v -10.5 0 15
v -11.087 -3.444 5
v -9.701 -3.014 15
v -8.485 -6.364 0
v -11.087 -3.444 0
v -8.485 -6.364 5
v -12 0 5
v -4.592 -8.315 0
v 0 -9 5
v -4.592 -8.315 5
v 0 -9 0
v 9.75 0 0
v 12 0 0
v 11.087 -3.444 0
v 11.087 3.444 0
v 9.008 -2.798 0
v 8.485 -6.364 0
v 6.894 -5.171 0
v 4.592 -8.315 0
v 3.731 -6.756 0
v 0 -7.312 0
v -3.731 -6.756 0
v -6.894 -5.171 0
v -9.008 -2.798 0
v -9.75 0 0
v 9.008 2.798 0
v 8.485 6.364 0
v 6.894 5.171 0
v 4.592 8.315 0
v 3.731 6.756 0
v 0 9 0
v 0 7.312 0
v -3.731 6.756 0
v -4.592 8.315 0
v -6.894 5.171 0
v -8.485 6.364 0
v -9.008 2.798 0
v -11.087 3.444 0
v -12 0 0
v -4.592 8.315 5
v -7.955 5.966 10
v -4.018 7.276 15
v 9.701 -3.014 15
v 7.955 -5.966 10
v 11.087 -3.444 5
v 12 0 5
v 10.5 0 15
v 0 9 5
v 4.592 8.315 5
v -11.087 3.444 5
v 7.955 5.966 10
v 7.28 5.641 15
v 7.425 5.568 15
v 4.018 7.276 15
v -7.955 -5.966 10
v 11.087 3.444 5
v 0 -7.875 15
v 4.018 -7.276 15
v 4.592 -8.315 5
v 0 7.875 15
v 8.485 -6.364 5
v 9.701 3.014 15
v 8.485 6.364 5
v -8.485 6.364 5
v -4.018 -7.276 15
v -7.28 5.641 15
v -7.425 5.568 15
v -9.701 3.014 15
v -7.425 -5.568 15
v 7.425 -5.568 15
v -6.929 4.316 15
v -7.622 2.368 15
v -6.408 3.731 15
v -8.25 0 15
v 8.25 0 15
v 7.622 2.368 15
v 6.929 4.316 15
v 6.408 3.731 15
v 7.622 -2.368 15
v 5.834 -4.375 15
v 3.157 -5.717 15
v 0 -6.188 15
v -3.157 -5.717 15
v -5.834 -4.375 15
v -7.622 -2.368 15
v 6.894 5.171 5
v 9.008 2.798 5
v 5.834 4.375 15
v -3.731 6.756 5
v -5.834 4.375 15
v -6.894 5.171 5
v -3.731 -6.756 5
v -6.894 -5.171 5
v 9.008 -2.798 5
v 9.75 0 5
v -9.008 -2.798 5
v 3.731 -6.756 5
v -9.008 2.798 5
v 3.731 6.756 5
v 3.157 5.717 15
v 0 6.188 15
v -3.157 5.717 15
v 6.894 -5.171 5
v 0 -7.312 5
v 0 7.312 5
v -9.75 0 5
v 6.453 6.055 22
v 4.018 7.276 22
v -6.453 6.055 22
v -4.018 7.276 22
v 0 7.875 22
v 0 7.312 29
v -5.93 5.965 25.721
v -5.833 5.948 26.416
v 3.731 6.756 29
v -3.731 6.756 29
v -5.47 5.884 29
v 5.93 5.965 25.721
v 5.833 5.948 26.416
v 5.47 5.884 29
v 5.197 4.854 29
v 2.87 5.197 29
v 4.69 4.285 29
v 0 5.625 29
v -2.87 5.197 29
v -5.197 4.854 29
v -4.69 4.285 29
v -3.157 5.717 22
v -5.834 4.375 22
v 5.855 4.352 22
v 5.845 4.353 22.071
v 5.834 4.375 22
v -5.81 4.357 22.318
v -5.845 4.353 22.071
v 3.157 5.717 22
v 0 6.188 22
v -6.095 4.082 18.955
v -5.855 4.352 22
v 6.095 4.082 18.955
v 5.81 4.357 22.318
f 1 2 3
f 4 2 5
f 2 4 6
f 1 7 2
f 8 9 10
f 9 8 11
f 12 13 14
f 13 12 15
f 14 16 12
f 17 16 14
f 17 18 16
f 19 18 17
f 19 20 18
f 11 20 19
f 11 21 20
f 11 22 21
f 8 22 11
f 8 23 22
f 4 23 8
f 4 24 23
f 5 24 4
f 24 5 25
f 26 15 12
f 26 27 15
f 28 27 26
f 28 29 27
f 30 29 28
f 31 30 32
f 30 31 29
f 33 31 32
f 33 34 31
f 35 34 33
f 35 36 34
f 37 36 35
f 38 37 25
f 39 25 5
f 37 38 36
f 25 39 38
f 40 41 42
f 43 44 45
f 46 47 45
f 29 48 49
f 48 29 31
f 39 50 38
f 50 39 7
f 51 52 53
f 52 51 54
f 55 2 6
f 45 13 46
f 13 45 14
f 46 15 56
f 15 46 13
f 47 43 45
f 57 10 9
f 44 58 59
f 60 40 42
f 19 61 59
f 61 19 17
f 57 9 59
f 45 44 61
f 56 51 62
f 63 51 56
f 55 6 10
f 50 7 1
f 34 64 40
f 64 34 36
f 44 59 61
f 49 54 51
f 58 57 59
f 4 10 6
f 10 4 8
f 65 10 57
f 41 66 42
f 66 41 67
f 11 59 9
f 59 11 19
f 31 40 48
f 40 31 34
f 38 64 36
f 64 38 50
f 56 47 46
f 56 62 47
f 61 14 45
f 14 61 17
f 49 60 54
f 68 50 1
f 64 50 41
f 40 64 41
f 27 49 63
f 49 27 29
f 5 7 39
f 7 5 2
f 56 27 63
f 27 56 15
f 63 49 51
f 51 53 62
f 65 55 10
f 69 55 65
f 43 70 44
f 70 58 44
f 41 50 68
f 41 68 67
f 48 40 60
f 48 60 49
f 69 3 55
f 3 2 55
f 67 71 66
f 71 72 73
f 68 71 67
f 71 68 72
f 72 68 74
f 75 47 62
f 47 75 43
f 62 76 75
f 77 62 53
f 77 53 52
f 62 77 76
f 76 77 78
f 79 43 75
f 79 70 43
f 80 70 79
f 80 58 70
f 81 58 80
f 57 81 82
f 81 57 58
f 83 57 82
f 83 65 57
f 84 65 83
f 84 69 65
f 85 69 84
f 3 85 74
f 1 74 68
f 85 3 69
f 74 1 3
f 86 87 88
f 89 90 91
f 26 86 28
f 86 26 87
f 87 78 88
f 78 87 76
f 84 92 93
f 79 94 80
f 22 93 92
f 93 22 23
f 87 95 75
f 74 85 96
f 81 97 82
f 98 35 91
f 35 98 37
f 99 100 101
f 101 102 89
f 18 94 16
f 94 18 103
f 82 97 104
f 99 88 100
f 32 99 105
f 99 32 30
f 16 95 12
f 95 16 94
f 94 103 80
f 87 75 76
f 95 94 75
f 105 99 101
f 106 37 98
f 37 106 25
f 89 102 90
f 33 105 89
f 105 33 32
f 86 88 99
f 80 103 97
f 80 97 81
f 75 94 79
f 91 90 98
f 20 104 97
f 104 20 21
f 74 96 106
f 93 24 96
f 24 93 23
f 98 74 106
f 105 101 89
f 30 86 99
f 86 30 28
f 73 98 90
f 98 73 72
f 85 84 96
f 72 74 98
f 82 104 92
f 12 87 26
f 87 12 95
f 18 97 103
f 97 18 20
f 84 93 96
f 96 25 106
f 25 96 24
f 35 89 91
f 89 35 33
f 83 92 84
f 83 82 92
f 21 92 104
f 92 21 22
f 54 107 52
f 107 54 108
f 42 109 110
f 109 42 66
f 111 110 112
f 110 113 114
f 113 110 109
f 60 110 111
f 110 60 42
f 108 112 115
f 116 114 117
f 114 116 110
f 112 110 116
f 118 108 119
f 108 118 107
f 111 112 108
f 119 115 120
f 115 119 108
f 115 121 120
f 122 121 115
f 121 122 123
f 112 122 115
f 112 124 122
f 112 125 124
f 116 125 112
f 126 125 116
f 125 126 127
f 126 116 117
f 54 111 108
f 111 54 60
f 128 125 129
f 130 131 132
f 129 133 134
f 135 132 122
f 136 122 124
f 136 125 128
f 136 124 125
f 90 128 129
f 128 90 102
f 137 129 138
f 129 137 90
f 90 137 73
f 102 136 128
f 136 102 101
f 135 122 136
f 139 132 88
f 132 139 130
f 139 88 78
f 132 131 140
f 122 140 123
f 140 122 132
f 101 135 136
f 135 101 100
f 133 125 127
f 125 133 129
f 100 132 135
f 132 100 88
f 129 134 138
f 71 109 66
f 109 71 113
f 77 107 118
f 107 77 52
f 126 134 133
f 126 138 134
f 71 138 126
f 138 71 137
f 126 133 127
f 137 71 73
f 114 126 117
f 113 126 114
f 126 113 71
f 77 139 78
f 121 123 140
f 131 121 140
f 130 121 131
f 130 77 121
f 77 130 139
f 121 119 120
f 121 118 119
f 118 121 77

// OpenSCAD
$fn=16;
finger_rings = [  // Finger = the bottom half of the pick
    [13, 5],  // [radius, height]. For radius, use the widest part of your finger.
    [12, 5],
    [11, 5],
];
thickness = 3;
aspect_ratio = 0.75;  // 
nail_rings = [  // Nail = the top part of the pick
    [11, 7],
    [10, 7],
];
nail_width_bottom = 20;
nail_width_top = 15;  // Do not go below thickness/2 for best result

// Determine dependent dimensions of model
nail_height = calculate_rings_height(nail_rings, len(nail_rings)-1);
total_height = calculate_rings_height(finger_rings, len(finger_rings)-1) + nail_height;
max_radius = calculate_rings_max_radius(finger_rings, len(finger_rings)-1);

// Warn if user stuffed up dimensions
if (finger_rings[len(finger_rings)-1][0] != nail_rings[0][0])
    echo("WARNING: finger and nail are not aligned, model will be broken");

function calculate_ring_z(finger_rings, i1) =  //  Use recursive functions because OpenSCAD calculates variables at runtime
    (i1 == 0 ? 0 : finger_rings[i1-1][1] + calculate_ring_z(finger_rings, i1-1));

function calculate_rings_height(finger_rings, i1) =
    (i1 == 0 ? finger_rings[0][1] : finger_rings[i1][1] + calculate_rings_height(finger_rings, i1-1));

function calculate_rings_max_radius(finger_rings, i1) = 
    (i1 == 0 ? finger_rings[0][0] : max(finger_rings[i1][0], finger_rings[i1-1][0]));

module create_hull(finger_rings) {
    hull() {
        for(i = [0 : len(finger_rings)-1]) {
            ring = finger_rings[i];
            r = ring[0];
            h = ring[1];
            z = calculate_ring_z(finger_rings, i);
            translate([0, 0, z])
                cylinder(r=r, h=h);
        }
    }
}

module create_rings(rings, thickness) {
    outer_rings = [for (i = [0:len(rings)-1]) [rings[i][0]+thickness, rings[i][1]]];
    difference() {
        create_hull(outer_rings);
        create_hull(rings);
    }
}

module create_nail(z, r) {
    nail_height = calculate_rings_height(nail_rings, len(nail_rings)-1);
    nail_y_offset = nail_rings[len(nail_rings)-1][0] + thickness/2;
    translate([0, 0, z]) {
        intersection() {
            create_rings(nail_rings, thickness=thickness);
            translate([0, nail_y_offset, 0])
                cylinder(h=nail_height, r1=nail_width_bottom/2, r2=nail_width_top/2);
        }
    }
}

module create_pick(finger_rings) {
    union() {
        create_rings(finger_rings, thickness=thickness);
        r = finger_rings[len(finger_rings)-1][0];
        z = calculate_rings_height(finger_rings, len(finger_rings)-1);
        create_nail(z, r);
    }
}

// Resize depth to aspect_ratio*width
resize([2*max_radius, 2*max_radius*aspect_ratio, total_height])
    create_pick(finger_rings);
